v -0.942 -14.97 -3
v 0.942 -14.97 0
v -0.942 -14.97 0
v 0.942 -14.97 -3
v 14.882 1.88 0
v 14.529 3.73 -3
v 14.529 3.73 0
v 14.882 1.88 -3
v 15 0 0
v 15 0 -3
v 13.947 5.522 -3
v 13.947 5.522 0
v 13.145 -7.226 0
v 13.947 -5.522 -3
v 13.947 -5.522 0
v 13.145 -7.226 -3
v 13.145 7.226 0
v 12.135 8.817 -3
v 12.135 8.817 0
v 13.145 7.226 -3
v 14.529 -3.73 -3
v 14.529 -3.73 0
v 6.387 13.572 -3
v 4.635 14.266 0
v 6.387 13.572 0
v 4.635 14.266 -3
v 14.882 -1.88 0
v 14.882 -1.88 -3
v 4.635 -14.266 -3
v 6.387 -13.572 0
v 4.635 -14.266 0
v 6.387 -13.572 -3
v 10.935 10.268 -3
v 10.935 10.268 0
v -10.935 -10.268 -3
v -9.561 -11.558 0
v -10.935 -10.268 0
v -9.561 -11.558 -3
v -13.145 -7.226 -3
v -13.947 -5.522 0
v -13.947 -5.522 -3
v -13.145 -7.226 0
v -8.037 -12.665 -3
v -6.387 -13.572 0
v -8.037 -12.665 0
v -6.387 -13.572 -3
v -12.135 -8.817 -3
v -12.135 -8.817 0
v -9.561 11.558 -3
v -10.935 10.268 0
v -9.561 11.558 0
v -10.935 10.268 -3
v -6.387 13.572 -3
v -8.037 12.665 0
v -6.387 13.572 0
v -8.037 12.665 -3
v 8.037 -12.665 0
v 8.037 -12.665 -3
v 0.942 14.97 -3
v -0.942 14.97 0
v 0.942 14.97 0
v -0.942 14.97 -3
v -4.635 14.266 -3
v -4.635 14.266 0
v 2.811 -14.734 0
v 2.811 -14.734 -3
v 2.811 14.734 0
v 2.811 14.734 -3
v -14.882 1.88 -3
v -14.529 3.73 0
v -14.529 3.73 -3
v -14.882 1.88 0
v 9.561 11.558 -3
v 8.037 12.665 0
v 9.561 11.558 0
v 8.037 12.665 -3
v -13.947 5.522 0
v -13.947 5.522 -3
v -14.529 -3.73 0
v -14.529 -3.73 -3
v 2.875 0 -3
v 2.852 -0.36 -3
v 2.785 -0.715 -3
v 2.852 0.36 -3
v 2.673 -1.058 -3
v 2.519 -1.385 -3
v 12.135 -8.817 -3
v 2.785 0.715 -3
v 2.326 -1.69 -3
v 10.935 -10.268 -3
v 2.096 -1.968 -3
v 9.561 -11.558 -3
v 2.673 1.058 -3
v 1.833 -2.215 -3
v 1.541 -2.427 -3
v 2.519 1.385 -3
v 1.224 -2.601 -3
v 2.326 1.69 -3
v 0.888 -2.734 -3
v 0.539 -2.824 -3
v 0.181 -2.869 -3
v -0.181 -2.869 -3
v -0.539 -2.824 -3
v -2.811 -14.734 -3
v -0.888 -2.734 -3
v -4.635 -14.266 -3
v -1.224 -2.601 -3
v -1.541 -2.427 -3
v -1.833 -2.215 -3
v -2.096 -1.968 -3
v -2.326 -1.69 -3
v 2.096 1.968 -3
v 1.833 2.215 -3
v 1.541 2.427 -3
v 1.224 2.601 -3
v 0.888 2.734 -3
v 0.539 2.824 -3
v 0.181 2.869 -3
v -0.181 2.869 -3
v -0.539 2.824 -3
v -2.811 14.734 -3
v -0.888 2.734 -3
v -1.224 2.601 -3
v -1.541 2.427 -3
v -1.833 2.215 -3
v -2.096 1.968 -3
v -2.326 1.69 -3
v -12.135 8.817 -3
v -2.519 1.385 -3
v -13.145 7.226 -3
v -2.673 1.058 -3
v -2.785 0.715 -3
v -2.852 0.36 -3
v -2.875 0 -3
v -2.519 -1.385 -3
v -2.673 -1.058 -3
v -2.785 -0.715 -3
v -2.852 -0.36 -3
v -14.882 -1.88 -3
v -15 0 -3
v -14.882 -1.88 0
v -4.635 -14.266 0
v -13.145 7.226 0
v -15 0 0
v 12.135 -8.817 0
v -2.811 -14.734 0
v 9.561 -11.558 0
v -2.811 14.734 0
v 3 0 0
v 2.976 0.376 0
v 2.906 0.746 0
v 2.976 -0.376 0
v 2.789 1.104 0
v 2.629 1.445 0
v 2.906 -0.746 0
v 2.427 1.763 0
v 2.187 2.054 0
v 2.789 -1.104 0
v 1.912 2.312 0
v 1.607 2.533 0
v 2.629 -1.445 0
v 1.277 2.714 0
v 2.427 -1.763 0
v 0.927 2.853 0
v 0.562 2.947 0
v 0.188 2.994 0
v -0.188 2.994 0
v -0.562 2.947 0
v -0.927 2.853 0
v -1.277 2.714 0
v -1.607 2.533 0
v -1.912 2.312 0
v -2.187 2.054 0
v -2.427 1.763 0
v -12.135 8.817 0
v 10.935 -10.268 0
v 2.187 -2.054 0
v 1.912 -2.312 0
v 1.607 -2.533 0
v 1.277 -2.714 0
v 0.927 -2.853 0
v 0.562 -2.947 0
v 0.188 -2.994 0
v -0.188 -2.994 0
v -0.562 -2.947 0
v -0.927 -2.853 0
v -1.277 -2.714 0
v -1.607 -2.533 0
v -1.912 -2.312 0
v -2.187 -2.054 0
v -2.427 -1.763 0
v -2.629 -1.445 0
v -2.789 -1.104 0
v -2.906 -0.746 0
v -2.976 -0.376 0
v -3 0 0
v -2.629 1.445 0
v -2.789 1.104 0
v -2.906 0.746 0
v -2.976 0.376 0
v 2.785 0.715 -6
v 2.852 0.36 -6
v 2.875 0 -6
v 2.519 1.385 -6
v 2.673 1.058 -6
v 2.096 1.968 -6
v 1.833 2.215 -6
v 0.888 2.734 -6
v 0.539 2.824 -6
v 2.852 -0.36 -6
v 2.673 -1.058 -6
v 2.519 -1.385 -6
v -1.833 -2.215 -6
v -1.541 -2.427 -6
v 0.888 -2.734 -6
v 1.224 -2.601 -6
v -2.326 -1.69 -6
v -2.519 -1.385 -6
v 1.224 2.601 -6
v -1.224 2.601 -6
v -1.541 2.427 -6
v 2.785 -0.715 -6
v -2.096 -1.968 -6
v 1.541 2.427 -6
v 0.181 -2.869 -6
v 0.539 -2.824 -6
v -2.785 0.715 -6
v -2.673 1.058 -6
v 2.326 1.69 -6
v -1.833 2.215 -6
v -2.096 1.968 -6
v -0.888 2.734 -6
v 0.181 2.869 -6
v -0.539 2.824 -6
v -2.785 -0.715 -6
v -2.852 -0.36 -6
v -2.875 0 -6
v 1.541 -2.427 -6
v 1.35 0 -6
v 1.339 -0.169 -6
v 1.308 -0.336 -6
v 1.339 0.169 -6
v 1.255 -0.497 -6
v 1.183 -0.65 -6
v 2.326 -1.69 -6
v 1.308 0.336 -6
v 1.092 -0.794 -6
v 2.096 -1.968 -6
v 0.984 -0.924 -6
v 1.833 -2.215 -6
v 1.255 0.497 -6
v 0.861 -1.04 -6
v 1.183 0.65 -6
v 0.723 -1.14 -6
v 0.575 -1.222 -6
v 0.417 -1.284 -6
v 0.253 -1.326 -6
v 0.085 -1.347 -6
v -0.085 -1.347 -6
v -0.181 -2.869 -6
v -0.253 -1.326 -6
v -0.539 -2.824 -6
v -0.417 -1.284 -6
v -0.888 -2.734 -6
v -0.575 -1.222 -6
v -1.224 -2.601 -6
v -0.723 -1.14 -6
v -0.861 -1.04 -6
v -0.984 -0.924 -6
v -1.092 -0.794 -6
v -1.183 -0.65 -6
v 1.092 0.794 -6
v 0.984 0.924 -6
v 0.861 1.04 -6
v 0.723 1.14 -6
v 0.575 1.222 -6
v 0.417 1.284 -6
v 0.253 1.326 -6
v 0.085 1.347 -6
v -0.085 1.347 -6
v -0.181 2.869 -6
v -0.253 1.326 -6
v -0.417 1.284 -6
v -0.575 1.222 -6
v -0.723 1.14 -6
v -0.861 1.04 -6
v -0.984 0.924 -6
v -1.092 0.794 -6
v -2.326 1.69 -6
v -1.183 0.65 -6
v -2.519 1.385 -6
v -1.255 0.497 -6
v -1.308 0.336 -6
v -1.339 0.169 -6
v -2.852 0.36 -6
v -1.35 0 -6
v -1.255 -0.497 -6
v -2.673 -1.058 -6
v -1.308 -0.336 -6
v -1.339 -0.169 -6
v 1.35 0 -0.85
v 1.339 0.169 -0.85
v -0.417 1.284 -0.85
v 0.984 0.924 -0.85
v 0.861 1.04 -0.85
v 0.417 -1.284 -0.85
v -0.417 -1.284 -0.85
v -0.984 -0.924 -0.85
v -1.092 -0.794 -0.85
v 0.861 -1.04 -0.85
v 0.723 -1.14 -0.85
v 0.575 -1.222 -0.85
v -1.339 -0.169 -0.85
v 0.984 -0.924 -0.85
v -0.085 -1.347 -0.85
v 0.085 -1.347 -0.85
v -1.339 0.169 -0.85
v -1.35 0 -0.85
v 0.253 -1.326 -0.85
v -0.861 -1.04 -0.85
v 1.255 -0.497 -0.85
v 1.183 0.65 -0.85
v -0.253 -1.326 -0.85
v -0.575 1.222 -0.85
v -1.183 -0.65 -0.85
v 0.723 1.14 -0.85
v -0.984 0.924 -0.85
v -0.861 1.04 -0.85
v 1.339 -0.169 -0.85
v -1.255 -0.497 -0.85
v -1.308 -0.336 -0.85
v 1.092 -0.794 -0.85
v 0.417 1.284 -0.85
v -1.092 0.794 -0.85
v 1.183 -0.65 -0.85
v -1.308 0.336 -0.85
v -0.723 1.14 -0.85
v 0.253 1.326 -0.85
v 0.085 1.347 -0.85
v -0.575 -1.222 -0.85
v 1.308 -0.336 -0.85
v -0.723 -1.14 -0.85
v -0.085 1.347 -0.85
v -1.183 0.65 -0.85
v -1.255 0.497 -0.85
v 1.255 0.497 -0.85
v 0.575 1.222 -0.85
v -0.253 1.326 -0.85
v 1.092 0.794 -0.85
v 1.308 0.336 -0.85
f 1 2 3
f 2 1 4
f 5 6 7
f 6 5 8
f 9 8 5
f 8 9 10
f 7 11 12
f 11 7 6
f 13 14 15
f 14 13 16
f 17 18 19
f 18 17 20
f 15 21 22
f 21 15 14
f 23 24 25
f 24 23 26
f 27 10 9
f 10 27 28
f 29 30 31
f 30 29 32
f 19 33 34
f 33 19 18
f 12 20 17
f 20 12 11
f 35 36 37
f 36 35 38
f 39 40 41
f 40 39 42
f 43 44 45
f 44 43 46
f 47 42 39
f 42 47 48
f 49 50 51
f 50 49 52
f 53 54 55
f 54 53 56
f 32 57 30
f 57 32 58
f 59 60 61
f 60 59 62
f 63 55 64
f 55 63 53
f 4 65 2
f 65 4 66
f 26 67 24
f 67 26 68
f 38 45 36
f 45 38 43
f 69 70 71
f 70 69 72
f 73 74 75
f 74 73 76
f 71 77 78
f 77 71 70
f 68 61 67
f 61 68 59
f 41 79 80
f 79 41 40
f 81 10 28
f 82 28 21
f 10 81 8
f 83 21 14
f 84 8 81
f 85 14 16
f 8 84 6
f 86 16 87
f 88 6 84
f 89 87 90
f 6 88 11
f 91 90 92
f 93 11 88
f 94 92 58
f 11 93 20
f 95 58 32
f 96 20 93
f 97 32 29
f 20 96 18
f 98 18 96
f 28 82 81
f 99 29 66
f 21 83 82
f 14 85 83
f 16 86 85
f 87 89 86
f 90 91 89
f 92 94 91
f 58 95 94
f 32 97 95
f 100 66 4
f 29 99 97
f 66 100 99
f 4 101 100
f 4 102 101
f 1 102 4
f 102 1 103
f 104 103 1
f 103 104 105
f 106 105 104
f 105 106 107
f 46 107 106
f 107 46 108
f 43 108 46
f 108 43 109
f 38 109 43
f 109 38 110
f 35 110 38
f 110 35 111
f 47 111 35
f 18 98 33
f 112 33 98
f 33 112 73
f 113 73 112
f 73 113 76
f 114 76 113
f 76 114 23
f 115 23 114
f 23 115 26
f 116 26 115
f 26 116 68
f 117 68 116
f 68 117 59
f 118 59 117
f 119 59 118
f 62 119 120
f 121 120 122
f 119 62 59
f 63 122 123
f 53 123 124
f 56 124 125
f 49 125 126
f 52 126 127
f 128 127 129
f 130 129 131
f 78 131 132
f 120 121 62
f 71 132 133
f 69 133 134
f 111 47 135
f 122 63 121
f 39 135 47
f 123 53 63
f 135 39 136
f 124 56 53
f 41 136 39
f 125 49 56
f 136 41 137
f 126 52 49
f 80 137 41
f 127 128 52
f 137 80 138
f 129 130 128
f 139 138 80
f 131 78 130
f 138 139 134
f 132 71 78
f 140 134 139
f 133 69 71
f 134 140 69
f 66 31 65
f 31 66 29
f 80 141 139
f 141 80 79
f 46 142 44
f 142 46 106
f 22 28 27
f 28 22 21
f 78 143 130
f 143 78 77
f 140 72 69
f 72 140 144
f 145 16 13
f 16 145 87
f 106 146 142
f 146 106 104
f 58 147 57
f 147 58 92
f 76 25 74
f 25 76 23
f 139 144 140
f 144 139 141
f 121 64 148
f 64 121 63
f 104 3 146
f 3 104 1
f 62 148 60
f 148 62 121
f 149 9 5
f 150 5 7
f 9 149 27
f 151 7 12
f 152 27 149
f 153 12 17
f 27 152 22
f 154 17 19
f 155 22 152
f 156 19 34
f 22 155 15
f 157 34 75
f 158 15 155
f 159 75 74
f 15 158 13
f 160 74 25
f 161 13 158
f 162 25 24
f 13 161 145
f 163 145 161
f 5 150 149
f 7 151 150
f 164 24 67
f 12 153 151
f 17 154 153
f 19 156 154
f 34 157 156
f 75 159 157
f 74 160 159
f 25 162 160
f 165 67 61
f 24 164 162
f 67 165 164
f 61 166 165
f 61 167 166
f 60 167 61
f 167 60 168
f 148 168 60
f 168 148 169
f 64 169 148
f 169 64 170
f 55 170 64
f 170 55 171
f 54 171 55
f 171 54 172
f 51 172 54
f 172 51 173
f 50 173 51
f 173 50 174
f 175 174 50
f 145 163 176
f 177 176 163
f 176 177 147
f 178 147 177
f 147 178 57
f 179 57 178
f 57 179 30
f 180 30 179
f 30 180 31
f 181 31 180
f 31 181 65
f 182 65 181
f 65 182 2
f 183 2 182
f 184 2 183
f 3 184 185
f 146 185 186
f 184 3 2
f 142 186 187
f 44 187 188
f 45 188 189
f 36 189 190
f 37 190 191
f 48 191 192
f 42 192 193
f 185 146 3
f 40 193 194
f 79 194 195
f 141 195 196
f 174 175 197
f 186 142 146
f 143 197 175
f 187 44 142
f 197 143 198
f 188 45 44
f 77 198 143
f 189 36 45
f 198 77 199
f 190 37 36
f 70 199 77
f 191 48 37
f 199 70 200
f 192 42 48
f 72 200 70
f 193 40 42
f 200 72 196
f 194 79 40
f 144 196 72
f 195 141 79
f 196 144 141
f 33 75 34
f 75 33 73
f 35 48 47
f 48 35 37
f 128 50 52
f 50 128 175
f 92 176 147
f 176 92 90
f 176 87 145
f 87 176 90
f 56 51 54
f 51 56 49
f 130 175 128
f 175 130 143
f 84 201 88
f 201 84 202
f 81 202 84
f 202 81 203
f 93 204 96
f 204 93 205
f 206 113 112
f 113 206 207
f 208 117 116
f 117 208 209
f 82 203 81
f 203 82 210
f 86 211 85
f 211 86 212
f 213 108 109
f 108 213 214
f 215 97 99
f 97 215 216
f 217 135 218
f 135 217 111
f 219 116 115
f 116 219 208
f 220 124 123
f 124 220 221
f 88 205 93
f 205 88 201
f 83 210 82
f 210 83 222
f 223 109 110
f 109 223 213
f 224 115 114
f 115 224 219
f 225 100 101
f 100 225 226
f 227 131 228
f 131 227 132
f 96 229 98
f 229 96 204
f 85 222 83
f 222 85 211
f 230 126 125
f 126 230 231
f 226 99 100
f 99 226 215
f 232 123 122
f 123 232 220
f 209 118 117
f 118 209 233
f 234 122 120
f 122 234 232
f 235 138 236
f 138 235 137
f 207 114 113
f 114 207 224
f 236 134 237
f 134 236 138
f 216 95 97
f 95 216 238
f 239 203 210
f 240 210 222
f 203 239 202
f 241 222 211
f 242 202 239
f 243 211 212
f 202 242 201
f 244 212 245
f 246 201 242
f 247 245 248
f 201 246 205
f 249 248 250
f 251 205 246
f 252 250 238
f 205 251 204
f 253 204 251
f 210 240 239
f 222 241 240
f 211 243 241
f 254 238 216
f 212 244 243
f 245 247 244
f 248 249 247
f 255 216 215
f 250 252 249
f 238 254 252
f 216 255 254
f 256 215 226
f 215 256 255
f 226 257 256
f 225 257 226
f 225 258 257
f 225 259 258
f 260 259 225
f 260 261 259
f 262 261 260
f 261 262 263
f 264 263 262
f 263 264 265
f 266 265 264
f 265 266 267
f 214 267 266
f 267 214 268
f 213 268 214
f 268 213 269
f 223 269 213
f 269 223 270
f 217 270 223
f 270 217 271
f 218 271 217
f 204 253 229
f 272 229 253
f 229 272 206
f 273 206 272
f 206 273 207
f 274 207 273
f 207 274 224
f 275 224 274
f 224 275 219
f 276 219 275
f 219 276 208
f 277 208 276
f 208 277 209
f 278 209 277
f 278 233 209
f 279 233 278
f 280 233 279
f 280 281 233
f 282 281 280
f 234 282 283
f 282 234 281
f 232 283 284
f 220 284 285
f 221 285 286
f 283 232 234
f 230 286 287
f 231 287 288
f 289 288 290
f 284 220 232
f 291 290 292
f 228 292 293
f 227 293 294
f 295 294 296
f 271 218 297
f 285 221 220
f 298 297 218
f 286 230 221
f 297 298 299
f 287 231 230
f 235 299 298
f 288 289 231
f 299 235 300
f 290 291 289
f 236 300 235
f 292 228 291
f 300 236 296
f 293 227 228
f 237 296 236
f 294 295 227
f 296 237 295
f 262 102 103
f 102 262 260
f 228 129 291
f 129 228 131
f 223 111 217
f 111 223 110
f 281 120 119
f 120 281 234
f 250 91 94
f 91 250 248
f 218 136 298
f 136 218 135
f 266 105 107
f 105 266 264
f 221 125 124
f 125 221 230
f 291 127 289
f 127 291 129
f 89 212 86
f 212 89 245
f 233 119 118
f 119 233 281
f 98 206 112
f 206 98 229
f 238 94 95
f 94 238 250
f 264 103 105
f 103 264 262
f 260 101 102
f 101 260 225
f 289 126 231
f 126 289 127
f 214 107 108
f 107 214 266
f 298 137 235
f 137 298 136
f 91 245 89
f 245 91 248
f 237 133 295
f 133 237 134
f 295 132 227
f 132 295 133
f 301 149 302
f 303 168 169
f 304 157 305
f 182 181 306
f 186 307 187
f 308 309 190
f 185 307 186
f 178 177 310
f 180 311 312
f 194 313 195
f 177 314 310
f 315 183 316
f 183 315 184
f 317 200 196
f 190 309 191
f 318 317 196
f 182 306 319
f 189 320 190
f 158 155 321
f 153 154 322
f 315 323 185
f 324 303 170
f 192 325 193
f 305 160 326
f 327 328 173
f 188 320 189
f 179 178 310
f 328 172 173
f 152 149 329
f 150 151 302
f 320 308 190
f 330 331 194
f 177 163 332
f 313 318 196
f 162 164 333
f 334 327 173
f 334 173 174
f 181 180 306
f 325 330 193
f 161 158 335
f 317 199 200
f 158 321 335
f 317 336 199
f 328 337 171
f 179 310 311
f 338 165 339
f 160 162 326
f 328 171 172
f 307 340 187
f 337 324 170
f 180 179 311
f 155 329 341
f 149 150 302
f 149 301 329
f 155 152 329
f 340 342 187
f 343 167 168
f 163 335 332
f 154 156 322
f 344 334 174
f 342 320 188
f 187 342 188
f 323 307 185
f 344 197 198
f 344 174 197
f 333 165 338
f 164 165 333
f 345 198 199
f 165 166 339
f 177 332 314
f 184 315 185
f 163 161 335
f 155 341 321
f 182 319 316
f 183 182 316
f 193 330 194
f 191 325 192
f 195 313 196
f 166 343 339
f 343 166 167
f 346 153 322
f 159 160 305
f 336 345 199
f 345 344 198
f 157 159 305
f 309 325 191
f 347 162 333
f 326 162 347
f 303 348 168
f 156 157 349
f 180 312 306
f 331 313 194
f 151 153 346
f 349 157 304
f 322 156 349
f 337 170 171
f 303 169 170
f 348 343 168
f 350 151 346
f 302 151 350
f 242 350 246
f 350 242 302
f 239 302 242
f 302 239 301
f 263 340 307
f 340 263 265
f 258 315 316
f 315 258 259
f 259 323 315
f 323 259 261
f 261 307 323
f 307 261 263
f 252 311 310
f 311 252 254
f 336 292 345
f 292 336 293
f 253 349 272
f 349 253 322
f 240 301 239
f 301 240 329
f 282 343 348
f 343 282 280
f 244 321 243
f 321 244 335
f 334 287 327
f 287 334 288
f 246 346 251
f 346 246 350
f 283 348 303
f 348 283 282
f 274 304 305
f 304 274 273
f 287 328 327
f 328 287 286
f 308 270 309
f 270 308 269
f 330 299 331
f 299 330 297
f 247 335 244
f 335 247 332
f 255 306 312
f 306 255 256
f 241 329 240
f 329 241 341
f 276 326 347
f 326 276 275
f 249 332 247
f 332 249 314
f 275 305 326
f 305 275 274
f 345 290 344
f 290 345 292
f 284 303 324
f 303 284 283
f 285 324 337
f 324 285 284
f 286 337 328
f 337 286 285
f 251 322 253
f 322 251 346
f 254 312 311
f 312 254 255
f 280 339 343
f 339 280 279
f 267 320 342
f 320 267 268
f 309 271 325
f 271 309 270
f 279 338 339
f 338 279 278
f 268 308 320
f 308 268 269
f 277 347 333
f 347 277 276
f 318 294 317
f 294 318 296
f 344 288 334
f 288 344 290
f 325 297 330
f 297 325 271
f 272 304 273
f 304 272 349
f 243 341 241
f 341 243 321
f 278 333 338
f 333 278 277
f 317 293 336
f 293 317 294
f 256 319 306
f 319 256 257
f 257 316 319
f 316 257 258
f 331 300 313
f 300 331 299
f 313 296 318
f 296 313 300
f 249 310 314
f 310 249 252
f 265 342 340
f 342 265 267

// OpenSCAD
$fn = 50;

difference() {
	union() {
		translate(v = [0, 0, -3.0]) {
			cylinder(h = 3, r = 15.0);
		}
		#translate(v = [0, 0, -6.0]) {
			cylinder(h = 6, r = 2.875);
		}
	}
	union() {
		translate(v = [0, 0, 0]) {
			rotate(a = [0, 0, 0]) {
				difference() {
					union() {
						translate(v = [0, 0, -6.0]) {
							cylinder(h = 6, r = 1.0);
						}
						translate(v = [0, 0, -0.85]) {
							cylinder(h = 0.85, r1 = 1.35, r2 = 3.0);
						}
						translate(v = [0, 0, -6.0]) {
							cylinder(h = 6, r = 1.35);
						}
						translate(v = [0, 0, -6.0]) {
							cylinder(h = 6, r = 1.0);
						}
					}
					union();
				}
			}
		}
	}
}
